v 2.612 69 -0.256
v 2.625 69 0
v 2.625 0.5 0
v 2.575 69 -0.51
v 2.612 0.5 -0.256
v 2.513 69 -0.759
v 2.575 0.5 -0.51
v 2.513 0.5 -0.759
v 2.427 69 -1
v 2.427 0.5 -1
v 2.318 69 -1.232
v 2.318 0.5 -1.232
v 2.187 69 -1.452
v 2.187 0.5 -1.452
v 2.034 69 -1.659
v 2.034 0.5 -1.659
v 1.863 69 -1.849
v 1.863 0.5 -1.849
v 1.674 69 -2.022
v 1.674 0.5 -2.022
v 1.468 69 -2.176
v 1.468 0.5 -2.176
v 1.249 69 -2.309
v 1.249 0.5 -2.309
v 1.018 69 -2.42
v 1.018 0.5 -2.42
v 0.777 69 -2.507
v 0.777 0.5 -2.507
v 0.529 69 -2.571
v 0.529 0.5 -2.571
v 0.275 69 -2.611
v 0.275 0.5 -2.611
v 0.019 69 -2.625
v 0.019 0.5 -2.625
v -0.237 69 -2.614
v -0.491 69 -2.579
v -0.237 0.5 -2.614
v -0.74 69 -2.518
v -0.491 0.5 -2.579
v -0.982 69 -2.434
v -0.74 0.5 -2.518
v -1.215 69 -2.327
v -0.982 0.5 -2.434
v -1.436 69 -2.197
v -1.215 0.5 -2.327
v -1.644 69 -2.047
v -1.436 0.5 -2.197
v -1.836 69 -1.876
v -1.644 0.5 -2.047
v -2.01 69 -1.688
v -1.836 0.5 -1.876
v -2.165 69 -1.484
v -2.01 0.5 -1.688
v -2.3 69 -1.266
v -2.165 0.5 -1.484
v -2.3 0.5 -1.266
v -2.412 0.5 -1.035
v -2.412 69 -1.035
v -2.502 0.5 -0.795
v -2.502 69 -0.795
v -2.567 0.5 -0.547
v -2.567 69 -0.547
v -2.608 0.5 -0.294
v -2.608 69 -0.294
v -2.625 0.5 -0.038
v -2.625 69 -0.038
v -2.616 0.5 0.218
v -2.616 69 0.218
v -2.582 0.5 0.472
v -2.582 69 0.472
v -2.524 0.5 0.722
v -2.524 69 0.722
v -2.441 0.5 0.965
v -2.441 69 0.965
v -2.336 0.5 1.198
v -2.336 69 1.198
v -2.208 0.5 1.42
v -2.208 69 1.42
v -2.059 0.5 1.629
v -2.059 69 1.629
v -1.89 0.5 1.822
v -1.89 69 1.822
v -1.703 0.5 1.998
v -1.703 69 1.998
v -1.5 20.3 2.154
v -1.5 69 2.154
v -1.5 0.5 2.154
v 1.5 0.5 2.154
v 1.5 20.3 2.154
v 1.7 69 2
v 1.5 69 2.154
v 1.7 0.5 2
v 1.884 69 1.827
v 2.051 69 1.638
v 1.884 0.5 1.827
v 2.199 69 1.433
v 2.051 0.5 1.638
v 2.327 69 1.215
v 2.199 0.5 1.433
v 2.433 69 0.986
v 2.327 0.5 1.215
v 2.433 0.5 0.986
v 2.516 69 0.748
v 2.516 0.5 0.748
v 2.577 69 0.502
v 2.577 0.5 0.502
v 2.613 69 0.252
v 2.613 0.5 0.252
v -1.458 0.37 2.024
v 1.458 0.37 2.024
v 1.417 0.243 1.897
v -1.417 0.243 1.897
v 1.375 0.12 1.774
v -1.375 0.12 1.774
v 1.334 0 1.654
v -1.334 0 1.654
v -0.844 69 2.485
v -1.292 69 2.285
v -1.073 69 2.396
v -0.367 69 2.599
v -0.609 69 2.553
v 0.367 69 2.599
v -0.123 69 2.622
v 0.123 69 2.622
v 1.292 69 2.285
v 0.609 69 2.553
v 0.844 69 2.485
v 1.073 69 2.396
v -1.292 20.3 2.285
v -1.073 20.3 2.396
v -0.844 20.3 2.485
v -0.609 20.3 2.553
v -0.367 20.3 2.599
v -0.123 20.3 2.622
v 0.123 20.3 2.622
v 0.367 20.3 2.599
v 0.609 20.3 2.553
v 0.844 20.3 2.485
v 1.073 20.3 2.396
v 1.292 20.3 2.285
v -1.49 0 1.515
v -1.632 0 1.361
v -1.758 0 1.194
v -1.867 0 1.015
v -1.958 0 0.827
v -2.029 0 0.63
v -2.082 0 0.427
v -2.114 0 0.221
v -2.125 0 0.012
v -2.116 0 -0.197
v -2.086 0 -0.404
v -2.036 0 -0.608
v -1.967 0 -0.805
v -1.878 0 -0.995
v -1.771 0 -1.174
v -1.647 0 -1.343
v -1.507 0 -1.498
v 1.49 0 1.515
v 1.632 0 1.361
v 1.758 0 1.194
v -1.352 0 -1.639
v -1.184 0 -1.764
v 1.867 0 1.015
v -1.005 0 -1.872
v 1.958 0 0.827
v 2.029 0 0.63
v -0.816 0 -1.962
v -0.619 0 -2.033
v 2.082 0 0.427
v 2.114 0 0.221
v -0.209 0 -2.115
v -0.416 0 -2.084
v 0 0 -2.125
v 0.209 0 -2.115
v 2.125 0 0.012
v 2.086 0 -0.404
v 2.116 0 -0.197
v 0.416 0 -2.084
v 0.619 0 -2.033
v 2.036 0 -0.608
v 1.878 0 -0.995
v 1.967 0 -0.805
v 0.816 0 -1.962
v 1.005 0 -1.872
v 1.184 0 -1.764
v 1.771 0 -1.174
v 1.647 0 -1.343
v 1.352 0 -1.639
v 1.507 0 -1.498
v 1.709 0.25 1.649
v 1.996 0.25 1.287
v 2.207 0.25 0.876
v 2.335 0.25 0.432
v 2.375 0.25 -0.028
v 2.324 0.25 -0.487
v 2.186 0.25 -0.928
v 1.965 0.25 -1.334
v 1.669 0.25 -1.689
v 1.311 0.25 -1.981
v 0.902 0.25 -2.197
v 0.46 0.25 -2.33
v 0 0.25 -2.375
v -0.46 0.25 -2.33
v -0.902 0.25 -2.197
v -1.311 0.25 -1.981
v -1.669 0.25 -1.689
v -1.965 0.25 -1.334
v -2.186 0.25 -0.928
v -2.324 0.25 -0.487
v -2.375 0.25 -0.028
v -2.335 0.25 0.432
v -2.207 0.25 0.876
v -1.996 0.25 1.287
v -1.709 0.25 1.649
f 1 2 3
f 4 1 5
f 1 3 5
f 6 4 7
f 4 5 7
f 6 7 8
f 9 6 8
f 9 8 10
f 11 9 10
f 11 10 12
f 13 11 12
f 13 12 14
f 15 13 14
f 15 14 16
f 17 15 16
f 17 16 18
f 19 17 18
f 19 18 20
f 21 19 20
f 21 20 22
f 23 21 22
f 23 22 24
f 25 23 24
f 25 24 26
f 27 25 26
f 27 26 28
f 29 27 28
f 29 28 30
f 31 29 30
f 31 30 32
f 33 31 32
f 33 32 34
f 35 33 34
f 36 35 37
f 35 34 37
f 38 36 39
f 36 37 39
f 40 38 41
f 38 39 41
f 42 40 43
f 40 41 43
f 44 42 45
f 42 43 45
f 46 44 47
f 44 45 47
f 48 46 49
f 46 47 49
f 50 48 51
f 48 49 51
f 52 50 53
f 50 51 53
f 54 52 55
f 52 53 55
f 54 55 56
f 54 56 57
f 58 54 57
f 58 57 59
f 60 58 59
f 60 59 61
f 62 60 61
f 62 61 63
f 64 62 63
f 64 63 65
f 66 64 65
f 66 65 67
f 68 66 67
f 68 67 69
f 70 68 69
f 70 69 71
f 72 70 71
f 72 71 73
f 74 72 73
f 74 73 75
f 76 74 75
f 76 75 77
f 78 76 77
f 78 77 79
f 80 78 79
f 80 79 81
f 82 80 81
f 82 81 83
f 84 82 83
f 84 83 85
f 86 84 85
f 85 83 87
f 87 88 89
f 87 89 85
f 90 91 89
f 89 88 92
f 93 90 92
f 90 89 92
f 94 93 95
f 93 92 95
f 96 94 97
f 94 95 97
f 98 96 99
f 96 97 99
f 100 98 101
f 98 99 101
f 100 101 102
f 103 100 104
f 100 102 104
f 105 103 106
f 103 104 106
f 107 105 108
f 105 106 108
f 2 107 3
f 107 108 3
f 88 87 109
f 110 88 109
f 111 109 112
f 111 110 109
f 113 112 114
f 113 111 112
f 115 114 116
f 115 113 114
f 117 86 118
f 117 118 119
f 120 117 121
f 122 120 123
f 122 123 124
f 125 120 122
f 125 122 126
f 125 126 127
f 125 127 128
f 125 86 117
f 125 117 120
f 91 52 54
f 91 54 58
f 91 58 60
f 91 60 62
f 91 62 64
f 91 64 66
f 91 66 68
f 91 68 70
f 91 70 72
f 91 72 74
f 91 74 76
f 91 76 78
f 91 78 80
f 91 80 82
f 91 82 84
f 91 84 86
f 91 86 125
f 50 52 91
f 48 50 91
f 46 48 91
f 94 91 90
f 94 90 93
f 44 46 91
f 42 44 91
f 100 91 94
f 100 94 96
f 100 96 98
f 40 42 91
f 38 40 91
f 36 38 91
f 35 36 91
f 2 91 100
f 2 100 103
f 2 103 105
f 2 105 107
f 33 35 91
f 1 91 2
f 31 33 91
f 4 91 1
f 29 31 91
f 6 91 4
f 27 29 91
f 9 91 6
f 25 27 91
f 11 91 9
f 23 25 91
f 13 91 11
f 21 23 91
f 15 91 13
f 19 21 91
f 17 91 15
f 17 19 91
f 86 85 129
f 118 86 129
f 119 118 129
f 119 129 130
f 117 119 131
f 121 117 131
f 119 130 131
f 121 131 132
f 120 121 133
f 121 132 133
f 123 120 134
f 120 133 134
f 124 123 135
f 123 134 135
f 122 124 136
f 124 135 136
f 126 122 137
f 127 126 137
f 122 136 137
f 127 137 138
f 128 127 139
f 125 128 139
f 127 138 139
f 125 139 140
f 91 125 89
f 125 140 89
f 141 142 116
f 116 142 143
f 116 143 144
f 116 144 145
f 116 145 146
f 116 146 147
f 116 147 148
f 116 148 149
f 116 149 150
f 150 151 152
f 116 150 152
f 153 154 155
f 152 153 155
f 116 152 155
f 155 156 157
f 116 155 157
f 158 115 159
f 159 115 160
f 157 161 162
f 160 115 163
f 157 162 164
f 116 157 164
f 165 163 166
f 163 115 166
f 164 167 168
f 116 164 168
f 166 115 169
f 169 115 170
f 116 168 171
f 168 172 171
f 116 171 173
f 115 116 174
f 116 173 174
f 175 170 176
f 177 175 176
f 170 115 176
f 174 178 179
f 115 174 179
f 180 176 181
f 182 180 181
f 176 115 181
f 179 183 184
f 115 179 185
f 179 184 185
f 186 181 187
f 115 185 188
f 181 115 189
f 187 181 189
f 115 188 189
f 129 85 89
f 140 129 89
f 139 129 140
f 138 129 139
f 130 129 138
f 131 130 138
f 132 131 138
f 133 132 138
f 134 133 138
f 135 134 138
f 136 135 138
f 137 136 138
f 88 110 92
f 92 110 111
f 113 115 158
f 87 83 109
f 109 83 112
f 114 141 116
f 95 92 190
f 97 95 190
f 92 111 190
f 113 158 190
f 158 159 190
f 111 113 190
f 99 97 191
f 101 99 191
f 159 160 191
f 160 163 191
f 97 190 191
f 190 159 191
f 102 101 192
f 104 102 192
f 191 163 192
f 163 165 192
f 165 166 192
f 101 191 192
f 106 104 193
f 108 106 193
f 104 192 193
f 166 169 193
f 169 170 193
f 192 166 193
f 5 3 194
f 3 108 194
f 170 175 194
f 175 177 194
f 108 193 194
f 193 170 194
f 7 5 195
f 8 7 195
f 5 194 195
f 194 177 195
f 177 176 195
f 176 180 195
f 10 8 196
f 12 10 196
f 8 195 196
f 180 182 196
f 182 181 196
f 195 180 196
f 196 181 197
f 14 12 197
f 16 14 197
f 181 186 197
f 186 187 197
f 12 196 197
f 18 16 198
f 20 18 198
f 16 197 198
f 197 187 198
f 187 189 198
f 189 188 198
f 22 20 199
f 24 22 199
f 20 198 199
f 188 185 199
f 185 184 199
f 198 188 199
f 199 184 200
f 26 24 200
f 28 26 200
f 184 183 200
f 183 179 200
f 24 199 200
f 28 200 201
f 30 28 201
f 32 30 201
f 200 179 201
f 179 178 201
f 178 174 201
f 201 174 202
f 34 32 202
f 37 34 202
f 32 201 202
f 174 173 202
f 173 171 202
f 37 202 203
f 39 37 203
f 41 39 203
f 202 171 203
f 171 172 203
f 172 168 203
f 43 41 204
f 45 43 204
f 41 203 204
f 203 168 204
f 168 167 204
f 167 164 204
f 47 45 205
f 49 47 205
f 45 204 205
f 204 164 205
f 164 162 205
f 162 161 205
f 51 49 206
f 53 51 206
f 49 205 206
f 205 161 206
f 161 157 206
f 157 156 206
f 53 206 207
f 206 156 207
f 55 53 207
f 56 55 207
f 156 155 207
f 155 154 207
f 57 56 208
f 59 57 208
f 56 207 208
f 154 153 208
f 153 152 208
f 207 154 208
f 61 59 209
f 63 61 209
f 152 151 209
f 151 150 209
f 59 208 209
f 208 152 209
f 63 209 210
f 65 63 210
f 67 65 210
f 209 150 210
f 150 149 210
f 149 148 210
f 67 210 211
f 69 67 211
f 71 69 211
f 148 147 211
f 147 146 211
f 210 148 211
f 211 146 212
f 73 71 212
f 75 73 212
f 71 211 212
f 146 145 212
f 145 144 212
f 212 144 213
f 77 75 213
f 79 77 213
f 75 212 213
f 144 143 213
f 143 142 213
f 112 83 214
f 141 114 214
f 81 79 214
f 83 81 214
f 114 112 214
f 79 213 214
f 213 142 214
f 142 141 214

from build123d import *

# Parameters (mm, degrees)
BOSS_EXTRUDE1_DEPTH = 69
CUT_EXTRUDE1_DEPTH  = 20.3
CHAMFER1_SIZE       = 0.5


with BuildPart() as part:
    # Sketch1 → Boss-Extrude1 (new body)
    with BuildSketch(Plane(origin=(0, 0, 0), x_dir=(1, 0, 0), z_dir=(0, 1, 0))):
        with BuildLine():
            ThreePointArc((2.625, 0), (-1.215138881, 2.326813809), (-1.5, -2.154210992))
            Line((-1.5, -2.154210992), (1.5, -2.154210992))
            ThreePointArc((1.5, -2.154210992), (2.326813809, -1.215138881), (2.625, 0))
        make_face()
        with BuildLine():
            Line((1.5, -2.154210992), (-1.5, -2.154210992))
            ThreePointArc((-1.5, -2.154210992), (0, -2.625), (1.5, -2.154210992))
        make_face()
    extrude(amount=BOSS_EXTRUDE1_DEPTH)

    # Sketch1<3> → Cut-Extrude1 (cut)
    with BuildSketch(Plane(origin=(0, 0, 0), x_dir=(1, 0, 0), z_dir=(0, 1, 0))):
        with BuildLine():
            Line((1.5, -2.154210992), (-1.5, -2.154210992))
            ThreePointArc((-1.5, -2.154210992), (0, -2.625), (1.5, -2.154210992))
        make_face()
    extrude(amount=CUT_EXTRUDE1_DEPTH, mode=Mode.SUBTRACT)

    # Chamfer1
    # the kernel refuses this chamfer: 0.5 mm, written as the material it takes off along each edge
    with BuildSketch(Plane(origin=(2.785841494, 0, 2.154210992), x_dir=(0, 0.9996219169112968, 0.027495876610586494), z_dir=(-1, 0, 0))) as chamfer1_piece_1:
        Polygon((CHAMFER1_SIZE * 0.999621916911, CHAMFER1_SIZE * 0.0274958766106), (-CHAMFER1_SIZE * 0.0274958766106, CHAMFER1_SIZE * 0.999621916911), (0, 0), align=None)
    extrude(amount=5.571682988, mode=Mode.SUBTRACT)
    with BuildSketch(Plane(origin=(0, 0, 0), x_dir=(0.11608616482785569, 0, 0.9932391465984212), z_dir=(-0.9932391465984212, 0, 0.11608616482785569))) as chamfer1_piece_2:
        Polygon((2.625, CHAMFER1_SIZE), (2.625 - CHAMFER1_SIZE, 0), (2.625, 0), align=None)
    revolve(axis=Axis((0, 0, 0), (0, 1, 0)), revolution_arc=346.667445344, mode=Mode.SUBTRACT)


solid = part.part
